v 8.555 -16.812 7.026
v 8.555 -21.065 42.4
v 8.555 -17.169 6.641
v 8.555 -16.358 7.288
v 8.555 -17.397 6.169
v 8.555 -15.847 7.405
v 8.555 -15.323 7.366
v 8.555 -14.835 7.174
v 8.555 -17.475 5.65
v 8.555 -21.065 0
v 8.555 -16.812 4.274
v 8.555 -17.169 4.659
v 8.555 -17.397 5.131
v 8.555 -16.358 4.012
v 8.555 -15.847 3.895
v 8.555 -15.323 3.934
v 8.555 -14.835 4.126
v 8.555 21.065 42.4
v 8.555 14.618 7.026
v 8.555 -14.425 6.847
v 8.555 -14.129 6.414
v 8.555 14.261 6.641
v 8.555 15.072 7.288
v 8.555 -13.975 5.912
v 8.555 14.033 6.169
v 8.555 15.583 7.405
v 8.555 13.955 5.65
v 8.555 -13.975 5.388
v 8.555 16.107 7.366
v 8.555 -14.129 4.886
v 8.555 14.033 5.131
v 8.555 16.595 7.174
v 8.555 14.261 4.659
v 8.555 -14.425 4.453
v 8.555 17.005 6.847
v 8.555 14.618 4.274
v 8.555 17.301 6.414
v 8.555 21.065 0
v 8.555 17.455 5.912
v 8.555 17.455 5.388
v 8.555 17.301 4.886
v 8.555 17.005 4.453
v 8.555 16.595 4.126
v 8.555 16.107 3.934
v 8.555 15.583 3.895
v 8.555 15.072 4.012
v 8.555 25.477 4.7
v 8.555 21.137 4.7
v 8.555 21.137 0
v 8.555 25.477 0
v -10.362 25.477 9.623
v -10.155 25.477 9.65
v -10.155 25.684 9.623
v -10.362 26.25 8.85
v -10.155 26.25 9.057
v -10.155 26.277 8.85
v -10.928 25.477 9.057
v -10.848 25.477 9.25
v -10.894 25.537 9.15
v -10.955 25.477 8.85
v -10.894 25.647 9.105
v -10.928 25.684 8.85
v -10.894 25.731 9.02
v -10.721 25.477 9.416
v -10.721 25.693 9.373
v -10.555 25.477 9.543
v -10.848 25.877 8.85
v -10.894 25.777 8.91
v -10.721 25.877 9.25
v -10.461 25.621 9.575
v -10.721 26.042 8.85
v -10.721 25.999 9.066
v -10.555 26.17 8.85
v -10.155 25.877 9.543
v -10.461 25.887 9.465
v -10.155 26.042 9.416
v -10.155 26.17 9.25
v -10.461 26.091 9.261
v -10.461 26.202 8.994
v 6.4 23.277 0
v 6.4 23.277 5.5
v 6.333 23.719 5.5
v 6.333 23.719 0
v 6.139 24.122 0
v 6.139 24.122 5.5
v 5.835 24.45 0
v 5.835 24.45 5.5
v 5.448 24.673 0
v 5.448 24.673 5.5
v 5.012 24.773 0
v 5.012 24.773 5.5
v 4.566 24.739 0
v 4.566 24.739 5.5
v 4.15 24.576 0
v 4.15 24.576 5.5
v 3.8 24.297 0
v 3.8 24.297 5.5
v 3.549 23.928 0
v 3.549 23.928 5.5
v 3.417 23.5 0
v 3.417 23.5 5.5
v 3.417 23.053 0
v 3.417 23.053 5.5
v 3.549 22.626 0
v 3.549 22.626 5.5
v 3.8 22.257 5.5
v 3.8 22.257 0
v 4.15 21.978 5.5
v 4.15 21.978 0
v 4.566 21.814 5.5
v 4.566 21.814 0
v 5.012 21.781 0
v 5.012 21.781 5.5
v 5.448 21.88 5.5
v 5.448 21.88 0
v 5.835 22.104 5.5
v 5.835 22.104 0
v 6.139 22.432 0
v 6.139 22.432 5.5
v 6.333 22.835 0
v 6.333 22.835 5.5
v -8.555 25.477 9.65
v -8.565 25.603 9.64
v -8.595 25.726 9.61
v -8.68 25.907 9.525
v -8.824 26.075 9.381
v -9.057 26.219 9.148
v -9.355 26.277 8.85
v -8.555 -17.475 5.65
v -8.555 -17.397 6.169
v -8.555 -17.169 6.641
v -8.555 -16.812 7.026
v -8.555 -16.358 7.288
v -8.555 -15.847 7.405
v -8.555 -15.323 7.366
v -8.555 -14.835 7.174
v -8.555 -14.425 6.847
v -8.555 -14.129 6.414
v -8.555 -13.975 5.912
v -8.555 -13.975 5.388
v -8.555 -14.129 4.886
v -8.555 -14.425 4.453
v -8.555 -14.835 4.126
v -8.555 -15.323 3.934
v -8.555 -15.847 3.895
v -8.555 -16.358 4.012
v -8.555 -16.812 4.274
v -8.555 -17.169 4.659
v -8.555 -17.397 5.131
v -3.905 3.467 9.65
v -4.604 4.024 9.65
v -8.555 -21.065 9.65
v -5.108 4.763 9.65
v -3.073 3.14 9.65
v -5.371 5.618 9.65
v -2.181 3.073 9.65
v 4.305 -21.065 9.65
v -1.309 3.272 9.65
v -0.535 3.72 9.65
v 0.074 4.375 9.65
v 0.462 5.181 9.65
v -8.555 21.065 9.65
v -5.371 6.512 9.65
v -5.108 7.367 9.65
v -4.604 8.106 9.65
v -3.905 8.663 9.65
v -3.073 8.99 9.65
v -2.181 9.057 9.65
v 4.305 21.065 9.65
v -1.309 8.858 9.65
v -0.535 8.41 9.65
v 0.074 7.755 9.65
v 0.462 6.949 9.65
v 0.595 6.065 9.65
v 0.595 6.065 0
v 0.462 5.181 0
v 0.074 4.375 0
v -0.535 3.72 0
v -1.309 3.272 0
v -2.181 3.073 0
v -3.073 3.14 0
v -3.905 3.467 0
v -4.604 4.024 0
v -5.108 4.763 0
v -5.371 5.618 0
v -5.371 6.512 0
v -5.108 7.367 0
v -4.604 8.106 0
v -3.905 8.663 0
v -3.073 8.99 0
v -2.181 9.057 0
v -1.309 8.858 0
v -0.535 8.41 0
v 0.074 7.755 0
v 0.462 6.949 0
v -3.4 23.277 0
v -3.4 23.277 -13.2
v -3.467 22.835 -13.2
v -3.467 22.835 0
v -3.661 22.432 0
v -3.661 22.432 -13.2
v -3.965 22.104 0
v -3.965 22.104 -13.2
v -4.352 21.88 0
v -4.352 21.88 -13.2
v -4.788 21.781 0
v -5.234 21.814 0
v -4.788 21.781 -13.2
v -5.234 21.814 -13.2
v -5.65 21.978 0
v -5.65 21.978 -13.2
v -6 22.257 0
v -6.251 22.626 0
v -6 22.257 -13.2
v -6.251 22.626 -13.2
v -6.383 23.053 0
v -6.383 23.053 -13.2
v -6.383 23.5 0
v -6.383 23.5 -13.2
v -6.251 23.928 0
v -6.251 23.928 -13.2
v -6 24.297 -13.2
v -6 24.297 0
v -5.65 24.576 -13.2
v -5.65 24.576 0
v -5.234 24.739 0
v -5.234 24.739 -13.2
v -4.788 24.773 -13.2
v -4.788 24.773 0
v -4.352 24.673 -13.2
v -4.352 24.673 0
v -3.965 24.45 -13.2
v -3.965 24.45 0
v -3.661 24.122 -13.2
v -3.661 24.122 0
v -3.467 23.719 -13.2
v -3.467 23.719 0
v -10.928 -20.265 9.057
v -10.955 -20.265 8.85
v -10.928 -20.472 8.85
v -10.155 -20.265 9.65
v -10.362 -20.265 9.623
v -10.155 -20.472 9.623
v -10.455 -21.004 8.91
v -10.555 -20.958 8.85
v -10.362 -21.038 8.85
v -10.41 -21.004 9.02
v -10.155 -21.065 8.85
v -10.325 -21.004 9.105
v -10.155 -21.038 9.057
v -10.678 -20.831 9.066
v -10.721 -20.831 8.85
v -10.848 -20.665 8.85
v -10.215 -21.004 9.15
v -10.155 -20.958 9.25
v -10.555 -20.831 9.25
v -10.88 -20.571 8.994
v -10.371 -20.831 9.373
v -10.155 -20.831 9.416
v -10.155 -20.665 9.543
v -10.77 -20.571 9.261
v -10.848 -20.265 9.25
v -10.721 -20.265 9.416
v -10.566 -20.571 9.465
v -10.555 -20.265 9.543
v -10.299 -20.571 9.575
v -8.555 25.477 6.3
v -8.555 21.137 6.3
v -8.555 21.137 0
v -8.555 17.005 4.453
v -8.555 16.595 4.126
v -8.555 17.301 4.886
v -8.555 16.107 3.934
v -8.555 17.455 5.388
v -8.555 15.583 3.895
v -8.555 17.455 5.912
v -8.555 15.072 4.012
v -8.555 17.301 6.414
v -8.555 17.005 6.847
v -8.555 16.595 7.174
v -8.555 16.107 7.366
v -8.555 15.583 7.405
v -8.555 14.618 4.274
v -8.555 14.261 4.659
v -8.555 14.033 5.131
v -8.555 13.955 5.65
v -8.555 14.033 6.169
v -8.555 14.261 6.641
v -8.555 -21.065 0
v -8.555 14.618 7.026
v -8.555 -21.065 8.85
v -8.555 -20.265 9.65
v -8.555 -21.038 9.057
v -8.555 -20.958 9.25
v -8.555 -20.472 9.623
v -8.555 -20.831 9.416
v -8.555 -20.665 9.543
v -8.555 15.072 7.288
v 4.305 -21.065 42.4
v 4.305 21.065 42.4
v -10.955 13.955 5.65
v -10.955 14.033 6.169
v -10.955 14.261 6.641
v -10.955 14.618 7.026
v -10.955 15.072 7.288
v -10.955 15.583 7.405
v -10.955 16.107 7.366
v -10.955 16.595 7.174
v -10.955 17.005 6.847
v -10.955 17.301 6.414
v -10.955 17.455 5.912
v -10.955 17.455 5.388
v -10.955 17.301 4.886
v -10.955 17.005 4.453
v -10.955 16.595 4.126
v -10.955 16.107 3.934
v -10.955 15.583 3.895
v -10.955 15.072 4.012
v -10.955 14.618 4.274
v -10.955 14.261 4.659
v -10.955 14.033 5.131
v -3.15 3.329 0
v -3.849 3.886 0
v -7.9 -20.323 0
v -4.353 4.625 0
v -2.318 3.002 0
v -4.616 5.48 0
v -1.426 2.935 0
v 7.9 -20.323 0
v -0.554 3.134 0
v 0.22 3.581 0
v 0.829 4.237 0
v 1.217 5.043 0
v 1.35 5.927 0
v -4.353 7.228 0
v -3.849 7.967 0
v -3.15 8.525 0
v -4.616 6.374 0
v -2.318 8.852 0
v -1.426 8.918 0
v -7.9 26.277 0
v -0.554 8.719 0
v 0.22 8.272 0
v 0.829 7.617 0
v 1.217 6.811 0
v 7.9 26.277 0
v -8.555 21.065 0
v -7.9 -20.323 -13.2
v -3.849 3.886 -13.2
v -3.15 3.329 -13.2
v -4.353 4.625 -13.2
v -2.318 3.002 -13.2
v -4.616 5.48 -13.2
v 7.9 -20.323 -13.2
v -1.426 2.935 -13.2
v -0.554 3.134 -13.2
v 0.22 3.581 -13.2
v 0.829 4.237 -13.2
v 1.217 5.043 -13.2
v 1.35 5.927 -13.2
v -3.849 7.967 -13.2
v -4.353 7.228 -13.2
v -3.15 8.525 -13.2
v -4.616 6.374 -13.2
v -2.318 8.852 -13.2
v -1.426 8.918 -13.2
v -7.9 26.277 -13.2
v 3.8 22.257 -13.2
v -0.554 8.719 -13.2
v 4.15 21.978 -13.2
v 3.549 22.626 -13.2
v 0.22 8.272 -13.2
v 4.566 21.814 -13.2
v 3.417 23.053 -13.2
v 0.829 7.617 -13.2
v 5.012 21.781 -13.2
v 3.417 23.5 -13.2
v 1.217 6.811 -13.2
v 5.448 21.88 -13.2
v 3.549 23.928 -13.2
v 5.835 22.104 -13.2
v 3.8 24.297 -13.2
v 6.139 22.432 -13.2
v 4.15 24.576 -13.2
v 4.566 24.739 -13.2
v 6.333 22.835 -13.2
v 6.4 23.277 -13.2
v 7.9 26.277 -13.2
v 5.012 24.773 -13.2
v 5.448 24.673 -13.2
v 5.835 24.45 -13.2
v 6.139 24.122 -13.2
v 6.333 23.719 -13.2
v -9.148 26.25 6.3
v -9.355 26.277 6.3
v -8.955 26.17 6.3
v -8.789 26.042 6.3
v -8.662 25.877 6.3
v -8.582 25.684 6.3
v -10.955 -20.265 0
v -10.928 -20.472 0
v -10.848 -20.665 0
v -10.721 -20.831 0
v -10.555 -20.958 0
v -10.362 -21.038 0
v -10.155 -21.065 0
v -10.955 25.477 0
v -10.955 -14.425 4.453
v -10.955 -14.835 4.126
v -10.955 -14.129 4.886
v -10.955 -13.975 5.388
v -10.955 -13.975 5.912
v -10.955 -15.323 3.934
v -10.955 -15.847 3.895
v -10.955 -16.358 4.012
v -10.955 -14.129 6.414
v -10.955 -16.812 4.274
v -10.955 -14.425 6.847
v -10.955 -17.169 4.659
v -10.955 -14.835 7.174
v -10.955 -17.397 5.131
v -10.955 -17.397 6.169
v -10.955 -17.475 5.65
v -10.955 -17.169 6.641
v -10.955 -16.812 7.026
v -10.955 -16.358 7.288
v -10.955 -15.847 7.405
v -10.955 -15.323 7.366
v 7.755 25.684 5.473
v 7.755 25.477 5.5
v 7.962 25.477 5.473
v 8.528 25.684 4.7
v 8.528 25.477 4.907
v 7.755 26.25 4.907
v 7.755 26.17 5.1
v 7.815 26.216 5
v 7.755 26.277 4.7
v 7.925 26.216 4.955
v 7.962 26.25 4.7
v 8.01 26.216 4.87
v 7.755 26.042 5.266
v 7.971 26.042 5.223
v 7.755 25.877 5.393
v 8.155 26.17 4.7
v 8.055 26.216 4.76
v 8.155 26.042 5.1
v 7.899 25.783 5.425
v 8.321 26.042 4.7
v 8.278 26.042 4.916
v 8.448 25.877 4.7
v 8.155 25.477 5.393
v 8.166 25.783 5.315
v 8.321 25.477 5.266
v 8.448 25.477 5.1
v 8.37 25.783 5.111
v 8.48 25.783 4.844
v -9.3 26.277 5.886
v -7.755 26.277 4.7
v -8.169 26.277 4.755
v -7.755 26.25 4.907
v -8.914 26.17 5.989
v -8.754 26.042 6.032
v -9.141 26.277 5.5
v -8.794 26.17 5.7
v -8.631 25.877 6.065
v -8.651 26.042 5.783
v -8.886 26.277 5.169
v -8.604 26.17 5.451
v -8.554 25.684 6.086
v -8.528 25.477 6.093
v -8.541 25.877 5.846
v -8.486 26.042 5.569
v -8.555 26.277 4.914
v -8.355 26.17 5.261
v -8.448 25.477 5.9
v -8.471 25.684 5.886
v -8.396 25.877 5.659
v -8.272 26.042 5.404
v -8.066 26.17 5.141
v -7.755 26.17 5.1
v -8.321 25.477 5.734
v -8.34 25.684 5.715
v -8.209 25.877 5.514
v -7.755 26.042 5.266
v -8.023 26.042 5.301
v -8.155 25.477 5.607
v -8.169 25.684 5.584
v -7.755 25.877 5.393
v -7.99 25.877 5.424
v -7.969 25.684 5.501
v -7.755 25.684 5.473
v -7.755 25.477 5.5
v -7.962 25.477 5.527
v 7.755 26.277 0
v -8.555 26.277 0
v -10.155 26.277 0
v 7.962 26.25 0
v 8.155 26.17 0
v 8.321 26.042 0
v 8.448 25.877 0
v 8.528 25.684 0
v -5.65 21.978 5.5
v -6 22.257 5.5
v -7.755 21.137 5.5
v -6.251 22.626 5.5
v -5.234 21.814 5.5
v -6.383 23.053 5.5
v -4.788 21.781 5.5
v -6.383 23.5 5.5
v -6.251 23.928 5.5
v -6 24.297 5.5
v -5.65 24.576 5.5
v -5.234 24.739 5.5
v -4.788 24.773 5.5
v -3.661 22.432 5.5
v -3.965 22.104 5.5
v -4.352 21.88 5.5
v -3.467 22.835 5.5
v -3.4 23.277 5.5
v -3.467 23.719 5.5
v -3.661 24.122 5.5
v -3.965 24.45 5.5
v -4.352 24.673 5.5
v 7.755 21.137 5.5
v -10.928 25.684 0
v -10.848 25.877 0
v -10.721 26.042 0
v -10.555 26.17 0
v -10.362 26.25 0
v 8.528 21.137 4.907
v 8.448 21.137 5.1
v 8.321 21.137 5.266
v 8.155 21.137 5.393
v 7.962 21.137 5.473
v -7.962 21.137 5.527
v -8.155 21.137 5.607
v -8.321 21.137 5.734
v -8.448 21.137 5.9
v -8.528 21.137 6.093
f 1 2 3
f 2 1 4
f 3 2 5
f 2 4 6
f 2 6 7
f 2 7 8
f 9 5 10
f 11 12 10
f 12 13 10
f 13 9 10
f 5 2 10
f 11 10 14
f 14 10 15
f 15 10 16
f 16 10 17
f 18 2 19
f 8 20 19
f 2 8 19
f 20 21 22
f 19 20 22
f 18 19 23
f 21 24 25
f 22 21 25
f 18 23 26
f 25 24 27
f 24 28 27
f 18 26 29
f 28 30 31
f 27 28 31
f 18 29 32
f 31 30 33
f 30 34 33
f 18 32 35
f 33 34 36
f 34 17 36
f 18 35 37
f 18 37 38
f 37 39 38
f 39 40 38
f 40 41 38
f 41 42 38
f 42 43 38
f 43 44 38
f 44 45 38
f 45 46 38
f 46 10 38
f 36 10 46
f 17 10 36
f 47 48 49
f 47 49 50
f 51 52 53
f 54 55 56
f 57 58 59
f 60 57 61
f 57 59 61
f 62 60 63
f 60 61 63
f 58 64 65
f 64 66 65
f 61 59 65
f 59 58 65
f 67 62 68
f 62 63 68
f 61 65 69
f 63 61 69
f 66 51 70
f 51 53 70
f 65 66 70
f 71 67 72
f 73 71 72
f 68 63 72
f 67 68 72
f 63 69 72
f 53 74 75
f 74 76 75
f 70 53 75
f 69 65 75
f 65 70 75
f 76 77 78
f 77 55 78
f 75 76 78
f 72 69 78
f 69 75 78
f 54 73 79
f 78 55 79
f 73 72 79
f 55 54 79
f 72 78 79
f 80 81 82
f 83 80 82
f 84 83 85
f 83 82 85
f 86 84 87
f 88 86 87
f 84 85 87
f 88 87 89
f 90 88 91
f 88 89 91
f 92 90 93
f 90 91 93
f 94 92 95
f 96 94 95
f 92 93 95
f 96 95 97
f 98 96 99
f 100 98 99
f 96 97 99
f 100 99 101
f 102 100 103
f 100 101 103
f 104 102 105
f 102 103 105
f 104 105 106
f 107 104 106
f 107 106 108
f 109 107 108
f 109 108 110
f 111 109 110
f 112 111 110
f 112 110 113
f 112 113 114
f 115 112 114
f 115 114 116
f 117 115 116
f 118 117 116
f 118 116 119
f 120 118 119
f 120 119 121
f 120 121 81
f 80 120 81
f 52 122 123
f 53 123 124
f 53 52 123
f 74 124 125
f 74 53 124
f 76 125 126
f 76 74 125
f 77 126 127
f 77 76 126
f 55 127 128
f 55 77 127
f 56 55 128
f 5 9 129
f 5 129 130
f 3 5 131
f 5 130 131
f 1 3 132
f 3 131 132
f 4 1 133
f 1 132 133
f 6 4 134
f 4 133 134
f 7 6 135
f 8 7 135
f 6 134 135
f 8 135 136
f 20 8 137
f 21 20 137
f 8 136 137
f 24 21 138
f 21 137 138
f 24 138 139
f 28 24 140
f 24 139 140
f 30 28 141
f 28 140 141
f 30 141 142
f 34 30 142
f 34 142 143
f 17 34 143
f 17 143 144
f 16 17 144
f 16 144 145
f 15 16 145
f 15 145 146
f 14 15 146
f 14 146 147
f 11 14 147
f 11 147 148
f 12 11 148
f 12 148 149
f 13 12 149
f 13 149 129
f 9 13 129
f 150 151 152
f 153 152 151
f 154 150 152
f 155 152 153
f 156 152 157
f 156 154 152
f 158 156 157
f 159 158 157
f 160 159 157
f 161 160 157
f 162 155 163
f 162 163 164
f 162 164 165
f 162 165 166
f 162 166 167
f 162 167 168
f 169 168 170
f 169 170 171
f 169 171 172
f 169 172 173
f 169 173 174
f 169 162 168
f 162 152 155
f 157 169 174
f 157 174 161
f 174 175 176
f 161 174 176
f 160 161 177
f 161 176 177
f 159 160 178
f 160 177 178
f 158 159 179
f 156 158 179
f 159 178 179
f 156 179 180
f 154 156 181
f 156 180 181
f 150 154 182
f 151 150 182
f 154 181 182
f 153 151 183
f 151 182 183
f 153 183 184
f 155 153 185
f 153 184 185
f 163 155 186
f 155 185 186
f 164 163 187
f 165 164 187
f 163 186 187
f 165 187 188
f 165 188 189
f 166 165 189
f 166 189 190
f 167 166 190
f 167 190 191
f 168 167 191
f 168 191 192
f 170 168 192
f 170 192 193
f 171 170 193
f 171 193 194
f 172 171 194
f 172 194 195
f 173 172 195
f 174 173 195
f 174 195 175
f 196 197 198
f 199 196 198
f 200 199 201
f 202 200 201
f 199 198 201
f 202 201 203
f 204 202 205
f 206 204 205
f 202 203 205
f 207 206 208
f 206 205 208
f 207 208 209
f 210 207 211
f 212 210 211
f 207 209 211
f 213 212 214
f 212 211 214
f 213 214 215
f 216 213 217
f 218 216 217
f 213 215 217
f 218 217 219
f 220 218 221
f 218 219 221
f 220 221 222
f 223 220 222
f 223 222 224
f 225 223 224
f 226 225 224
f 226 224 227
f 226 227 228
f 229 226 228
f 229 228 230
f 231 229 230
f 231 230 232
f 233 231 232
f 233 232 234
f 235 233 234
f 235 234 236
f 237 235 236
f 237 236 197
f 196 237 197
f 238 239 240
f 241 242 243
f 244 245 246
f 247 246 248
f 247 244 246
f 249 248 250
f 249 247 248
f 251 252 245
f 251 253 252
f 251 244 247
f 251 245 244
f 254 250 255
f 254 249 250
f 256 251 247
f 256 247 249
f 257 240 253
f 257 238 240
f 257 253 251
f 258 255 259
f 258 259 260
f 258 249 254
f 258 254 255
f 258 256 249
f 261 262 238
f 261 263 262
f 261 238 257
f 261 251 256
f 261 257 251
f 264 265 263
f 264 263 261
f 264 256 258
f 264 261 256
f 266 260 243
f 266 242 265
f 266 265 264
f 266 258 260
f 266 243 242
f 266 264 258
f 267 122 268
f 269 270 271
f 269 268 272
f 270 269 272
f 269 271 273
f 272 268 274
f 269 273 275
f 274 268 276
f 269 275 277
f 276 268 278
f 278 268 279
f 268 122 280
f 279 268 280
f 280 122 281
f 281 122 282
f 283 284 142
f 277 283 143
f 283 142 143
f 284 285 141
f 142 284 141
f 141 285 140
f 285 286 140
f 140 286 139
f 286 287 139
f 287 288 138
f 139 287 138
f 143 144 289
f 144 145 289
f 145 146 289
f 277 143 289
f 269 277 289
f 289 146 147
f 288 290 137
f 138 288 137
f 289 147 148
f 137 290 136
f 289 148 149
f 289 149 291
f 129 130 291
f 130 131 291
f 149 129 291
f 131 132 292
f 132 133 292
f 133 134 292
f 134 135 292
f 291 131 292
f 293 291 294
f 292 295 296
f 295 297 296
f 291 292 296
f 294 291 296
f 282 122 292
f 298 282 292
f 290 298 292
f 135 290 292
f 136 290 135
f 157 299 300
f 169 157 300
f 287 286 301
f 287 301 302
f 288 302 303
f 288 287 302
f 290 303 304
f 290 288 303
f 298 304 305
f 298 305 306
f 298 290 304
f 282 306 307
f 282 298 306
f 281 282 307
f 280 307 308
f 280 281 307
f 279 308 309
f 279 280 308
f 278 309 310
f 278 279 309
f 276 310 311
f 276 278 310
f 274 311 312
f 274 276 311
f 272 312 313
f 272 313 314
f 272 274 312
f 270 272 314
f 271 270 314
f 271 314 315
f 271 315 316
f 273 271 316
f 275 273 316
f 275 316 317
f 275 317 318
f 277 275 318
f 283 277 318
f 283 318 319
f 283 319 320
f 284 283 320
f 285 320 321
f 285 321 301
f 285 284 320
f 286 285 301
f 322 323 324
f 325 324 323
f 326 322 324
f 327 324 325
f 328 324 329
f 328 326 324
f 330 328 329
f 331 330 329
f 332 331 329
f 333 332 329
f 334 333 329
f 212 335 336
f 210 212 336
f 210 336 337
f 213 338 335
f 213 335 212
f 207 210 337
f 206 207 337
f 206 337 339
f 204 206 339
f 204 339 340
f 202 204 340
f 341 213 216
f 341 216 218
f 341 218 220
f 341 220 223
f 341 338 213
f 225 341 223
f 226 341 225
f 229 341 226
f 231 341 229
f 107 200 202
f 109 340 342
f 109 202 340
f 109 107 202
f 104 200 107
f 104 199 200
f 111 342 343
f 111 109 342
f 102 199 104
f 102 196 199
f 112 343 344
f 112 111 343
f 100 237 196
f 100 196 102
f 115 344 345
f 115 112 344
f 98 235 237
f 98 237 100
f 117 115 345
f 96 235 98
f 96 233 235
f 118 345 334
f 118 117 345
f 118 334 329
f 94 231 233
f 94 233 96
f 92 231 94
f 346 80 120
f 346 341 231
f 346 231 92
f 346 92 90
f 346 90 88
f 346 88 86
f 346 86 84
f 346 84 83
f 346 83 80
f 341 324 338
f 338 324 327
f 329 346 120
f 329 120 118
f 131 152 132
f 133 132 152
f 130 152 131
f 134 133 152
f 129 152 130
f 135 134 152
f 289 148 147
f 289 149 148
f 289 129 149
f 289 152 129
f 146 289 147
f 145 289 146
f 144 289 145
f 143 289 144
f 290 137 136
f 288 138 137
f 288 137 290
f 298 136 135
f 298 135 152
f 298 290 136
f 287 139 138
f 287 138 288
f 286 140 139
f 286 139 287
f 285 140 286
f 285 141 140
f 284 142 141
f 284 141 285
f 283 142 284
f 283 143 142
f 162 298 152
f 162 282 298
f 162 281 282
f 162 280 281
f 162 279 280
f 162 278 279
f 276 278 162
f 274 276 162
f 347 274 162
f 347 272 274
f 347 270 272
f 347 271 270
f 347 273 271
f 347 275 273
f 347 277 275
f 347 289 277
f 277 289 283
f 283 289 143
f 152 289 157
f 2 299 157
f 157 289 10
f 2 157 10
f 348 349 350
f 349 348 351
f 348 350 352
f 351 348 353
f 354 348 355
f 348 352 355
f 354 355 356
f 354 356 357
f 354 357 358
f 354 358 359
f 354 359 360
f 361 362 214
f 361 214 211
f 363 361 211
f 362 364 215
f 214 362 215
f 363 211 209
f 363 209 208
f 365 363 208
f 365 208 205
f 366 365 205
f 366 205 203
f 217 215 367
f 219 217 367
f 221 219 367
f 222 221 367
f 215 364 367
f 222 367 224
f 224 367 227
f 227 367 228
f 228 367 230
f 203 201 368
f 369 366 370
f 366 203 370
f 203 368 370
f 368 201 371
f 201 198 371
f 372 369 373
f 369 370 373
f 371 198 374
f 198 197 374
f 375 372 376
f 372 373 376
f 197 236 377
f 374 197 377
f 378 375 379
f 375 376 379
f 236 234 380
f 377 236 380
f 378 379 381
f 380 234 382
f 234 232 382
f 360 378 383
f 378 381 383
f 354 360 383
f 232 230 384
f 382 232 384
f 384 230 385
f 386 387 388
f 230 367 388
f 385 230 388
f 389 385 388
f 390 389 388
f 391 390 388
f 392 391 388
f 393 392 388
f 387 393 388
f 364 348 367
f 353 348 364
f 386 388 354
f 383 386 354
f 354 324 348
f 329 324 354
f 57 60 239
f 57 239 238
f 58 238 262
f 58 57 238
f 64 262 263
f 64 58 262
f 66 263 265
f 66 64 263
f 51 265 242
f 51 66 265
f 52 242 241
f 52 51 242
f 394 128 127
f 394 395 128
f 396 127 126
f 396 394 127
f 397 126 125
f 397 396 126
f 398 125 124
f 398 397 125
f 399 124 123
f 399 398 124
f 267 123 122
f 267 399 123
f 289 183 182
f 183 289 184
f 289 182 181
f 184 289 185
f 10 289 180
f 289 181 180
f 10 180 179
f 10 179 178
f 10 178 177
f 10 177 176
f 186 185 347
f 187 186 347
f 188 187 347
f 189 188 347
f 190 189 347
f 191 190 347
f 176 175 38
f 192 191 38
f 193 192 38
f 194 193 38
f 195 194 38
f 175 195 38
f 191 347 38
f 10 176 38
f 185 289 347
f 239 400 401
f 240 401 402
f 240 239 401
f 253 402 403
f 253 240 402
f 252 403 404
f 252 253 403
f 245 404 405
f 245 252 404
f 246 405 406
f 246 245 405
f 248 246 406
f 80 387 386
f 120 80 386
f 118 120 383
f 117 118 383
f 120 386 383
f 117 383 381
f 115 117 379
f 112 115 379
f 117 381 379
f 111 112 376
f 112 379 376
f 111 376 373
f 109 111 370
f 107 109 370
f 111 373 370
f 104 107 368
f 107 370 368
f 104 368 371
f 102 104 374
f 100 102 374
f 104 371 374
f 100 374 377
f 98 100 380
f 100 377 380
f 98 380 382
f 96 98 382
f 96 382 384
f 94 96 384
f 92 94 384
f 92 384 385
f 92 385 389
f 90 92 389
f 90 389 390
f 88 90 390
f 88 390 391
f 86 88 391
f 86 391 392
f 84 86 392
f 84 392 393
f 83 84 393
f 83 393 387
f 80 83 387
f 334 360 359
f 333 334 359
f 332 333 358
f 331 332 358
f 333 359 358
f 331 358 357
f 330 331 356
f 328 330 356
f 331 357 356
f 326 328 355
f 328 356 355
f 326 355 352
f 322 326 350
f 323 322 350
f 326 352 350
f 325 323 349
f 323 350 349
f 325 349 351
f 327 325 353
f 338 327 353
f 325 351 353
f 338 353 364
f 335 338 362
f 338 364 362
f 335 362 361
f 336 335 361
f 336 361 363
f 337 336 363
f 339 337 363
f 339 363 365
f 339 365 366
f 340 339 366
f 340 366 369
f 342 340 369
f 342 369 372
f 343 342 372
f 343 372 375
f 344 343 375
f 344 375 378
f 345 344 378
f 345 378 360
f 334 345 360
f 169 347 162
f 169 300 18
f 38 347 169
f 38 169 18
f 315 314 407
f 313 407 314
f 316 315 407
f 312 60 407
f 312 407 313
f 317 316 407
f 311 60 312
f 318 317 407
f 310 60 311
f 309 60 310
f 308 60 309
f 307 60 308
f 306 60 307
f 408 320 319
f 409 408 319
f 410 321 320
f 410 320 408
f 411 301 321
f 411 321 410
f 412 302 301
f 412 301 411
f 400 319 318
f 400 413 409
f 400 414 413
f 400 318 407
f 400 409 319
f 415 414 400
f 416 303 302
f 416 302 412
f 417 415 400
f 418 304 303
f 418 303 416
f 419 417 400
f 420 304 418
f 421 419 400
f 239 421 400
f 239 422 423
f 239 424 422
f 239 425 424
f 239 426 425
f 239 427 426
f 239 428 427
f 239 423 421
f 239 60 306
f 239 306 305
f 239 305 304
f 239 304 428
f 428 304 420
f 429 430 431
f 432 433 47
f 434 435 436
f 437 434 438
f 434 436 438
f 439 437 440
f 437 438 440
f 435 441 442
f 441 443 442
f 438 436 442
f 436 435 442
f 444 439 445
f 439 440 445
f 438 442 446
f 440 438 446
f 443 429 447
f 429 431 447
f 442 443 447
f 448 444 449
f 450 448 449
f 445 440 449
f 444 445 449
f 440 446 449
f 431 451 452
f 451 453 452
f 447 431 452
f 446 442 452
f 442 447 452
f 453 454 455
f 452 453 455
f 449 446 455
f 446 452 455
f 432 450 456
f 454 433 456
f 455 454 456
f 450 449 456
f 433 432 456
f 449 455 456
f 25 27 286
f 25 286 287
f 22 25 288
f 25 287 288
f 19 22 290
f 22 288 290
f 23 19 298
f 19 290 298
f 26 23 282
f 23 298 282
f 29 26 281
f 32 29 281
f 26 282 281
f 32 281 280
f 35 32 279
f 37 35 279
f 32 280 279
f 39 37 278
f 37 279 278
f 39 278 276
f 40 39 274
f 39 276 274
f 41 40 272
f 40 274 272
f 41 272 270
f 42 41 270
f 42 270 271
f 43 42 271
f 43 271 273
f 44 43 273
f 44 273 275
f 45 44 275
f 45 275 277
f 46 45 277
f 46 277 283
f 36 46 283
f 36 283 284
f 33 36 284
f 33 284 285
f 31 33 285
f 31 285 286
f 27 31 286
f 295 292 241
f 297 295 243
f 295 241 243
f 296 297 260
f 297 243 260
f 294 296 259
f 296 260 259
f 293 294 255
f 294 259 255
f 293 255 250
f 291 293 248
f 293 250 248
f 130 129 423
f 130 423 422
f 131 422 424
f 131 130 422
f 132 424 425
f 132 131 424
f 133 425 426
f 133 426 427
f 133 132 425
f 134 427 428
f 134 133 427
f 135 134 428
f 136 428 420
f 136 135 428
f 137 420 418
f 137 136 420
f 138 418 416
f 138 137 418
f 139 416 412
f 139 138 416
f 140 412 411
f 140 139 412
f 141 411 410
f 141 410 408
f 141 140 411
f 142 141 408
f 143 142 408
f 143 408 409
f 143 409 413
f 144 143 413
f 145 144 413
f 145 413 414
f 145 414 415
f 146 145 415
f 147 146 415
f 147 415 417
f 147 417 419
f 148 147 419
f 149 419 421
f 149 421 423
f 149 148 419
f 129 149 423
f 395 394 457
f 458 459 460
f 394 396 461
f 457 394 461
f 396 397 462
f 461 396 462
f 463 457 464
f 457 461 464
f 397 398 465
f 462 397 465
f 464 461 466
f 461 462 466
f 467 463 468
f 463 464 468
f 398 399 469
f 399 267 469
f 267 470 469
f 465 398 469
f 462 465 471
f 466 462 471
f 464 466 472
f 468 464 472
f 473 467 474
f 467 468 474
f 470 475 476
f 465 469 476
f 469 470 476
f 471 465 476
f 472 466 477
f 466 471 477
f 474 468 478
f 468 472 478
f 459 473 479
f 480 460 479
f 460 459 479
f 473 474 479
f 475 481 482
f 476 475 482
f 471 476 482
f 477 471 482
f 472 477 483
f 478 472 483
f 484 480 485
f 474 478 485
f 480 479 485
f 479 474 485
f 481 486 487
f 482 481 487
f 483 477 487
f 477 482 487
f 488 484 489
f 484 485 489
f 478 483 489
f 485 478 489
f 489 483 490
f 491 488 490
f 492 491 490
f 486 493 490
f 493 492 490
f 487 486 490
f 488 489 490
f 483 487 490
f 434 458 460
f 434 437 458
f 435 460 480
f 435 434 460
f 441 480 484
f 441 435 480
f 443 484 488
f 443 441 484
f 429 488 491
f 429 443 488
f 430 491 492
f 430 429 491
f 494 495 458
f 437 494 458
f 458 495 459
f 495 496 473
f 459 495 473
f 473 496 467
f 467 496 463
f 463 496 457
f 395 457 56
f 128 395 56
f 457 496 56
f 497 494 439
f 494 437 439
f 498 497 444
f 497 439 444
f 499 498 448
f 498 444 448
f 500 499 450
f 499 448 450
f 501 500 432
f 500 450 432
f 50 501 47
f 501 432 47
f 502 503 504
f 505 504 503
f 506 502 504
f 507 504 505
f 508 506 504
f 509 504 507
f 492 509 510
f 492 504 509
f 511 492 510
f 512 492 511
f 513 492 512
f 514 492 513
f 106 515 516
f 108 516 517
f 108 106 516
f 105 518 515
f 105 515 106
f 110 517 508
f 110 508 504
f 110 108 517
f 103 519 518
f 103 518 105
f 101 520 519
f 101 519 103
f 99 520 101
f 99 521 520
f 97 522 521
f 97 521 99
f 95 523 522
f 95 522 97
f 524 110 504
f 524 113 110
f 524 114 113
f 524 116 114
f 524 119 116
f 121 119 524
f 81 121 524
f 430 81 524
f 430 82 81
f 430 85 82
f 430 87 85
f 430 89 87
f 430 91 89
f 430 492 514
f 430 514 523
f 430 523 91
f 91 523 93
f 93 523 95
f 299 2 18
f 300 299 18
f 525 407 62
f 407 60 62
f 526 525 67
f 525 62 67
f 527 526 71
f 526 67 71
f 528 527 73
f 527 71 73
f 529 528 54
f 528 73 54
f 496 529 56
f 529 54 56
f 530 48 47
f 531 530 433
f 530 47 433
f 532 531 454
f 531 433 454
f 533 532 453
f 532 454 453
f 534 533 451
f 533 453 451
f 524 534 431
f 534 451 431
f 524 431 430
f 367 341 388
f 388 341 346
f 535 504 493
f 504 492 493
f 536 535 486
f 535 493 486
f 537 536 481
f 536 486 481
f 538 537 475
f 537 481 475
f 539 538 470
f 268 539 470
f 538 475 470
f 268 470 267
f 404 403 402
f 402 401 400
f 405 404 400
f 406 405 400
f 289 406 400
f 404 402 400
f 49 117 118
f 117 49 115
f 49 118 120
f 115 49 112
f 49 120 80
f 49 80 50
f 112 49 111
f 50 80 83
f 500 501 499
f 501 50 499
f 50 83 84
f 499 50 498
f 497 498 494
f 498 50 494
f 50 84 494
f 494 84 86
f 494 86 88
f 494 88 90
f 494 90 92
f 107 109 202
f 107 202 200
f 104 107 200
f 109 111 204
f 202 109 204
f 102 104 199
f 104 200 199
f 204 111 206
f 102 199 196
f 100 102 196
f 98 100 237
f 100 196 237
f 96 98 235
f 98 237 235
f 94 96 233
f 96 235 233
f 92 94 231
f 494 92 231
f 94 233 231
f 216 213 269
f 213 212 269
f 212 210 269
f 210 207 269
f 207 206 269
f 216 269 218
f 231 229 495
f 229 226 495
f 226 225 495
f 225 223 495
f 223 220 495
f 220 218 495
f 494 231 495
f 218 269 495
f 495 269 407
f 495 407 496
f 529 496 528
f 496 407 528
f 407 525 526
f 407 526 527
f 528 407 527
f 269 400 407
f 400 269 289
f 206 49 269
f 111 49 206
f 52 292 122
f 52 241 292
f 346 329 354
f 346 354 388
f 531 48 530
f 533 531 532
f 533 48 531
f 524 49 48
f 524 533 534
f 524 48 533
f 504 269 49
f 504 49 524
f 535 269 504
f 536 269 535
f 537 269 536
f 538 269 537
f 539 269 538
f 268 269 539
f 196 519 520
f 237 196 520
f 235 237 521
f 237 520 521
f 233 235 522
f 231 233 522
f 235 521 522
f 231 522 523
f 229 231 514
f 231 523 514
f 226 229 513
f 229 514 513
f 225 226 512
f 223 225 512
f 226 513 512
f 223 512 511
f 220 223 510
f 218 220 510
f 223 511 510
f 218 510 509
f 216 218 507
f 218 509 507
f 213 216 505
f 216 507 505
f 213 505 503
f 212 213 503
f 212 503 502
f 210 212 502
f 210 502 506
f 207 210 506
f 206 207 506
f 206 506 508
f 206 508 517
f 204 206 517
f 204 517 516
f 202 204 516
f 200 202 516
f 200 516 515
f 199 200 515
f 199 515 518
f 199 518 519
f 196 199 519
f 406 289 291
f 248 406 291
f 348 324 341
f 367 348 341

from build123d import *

# Parameters (mm, degrees)
F0_W      = 17.11
F0_H      = 42.13
F1_DEPTH  = 9.65
F3_W      = 42.13
F3_H      = 42.4
F4_DEPTH  = 4.25
F2_R      = 1.76
F5_DEPTH  = 17.111
F6_R      = 3
F7_DEPTH  = 25
F8_W      = 15.8
F8_H      = 46.6
F9_DEPTH  = 13.2
F10_R     = 3
F10_R_2   = 1.5
F11_DEPTH = 25
F12_W     = 42.13
F12_H     = 9.65
F12_R     = 1.76
F12_W_2   = 5.2117788947
F12_W_3   = 47.3417788947
F13_DEPTH = 2.4
F14_W     = 5.1398039788
F14_H     = 9.65
F15_DEPTH = 17.11
F16_R     = 1.5
F17_DEPTH = 25
F18_W     = 17.11
F18_H     = 5.1398039788
F19_DEPTH = 4.15
F20_R     = 0.8


with BuildPart() as f1:
    # F0 (on Top) → F1 (new body)
    with BuildSketch(Plane.XY):
        Rectangle(F0_W, F0_H)
    extrude(amount=F1_DEPTH)

    # F3 (on face) → F4 (join)
    with BuildSketch(Plane.YZ.offset(8.555)):
        with Locations((0, 21.2)):
            Rectangle(F3_W, F3_H)
    extrude(amount=-F4_DEPTH)

    # F2 (on face) → F5 (cut, through all)
    with BuildSketch(Plane(origin=(-8.555, 0, 0), x_dir=(0, -1, 0), z_dir=(-1, 0, 0))):
        with Locations((-15.715, 5.65)):
            Circle(F2_R)
        with Locations((15.715, 5.65)):
            Circle(F2_R)
    extrude(amount=-F5_DEPTH, mode=Mode.SUBTRACT)

    # F6 (on face) → F7 (cut)
    with BuildSketch(Plane(origin=(0, 0, 0), x_dir=(1, 0, 0), z_dir=(0, 0, -1))):
        with Locations((-2.405, -6.065)):
            Circle(F6_R)
    extrude(amount=-F7_DEPTH, mode=Mode.SUBTRACT)


with BuildPart() as f9:
    # F8 (on Top) → F9 (new body)
    with BuildSketch(Plane.XY):
        with Locations((0, 2.9767788947)):
            Rectangle(F8_W, F8_H)
    extrude(amount=-F9_DEPTH)

    # F10 (on face) → F11 (cut)
    with BuildSketch(Plane(origin=(0, 0, -13.2), x_dir=(1, 0, 0), z_dir=(0, 0, -1))):
        with Locations((-1.65, -5.9267788947)):
            Circle(F10_R)
        with Locations((-4.9, -23.2767788947)):
            Circle(F10_R_2)
        with Locations((4.9, -23.2767788947)):
            Circle(F10_R_2)
    extrude(amount=-F11_DEPTH, mode=Mode.SUBTRACT)


with BuildPart() as f13:
    # F12 (on face) → F13 (new body)
    with BuildSketch(Plane(origin=(-8.555, 0, 0), x_dir=(0, -1, 0), z_dir=(-1, 0, 0))):
        with Locations((0, 4.825)):
            Rectangle(F12_W, F12_H)
        with Locations((-15.715, 5.65)):
            Circle(F12_R, mode=Mode.SUBTRACT)
        with Locations((15.715, 5.65)):
            Circle(F12_R, mode=Mode.SUBTRACT)
        with Locations((-23.6708894473, 4.825)):
            Rectangle(F12_W_2, F12_H)
        with Locations((-2.6058894473, 4.825)):
            Rectangle(F12_W_3, F12_H)
        with Locations((-15.715, 5.65)):
            Circle(F12_R, mode=Mode.SUBTRACT)
        with Locations((15.715, 5.65)):
            Circle(F12_R, mode=Mode.SUBTRACT)
    extrude(amount=F13_DEPTH)

    # F14 (on face) → F15 (join, through all)
    with BuildSketch(Plane.YZ.offset(-8.555)):
        with Locations((23.7068769053, 4.825)):
            Rectangle(F14_W, F14_H)
    extrude(amount=F15_DEPTH)

    # F16 (on face) → F17 (cut)
    with BuildSketch(Plane.XY.offset(9.65)):
        with Locations((-4.9, 23.2767788947)):
            Circle(F16_R)
        with Locations((4.9, 23.2767788947)):
            Circle(F16_R)
    extrude(amount=-F17_DEPTH, mode=Mode.SUBTRACT)

    # F18 (on face) → F19 (cut)
    with BuildSketch(Plane.XY.offset(9.65)):
        with Locations((0, 23.7068769053)):
            Rectangle(F18_W, F18_H)
    extrude(amount=-F19_DEPTH, mode=Mode.SUBTRACT)

    # F20
    f20_edges = [f13.edges().sort_by_distance(p)[0] for p in [
        (8.555, 23.706877, 5.5),
        (0, 26.276779, 5.5),
        (-8.555, 23.706877, 5.5),
        (-8.555, 26.276779, 7.575),
        (-9.755, 26.276779, 9.65),
        (-10.955, 2.605889, 9.65),
        (-10.955, -21.065, 4.825),
        (-9.755, -21.065, 9.65),
        (8.555, 26.276779, 2.75),
        (-10.955, 26.276779, 4.825),
    ]]
    fillet(f20_edges, radius=F20_R)


solid = Compound([f1.part, f9.part, f13.part])
